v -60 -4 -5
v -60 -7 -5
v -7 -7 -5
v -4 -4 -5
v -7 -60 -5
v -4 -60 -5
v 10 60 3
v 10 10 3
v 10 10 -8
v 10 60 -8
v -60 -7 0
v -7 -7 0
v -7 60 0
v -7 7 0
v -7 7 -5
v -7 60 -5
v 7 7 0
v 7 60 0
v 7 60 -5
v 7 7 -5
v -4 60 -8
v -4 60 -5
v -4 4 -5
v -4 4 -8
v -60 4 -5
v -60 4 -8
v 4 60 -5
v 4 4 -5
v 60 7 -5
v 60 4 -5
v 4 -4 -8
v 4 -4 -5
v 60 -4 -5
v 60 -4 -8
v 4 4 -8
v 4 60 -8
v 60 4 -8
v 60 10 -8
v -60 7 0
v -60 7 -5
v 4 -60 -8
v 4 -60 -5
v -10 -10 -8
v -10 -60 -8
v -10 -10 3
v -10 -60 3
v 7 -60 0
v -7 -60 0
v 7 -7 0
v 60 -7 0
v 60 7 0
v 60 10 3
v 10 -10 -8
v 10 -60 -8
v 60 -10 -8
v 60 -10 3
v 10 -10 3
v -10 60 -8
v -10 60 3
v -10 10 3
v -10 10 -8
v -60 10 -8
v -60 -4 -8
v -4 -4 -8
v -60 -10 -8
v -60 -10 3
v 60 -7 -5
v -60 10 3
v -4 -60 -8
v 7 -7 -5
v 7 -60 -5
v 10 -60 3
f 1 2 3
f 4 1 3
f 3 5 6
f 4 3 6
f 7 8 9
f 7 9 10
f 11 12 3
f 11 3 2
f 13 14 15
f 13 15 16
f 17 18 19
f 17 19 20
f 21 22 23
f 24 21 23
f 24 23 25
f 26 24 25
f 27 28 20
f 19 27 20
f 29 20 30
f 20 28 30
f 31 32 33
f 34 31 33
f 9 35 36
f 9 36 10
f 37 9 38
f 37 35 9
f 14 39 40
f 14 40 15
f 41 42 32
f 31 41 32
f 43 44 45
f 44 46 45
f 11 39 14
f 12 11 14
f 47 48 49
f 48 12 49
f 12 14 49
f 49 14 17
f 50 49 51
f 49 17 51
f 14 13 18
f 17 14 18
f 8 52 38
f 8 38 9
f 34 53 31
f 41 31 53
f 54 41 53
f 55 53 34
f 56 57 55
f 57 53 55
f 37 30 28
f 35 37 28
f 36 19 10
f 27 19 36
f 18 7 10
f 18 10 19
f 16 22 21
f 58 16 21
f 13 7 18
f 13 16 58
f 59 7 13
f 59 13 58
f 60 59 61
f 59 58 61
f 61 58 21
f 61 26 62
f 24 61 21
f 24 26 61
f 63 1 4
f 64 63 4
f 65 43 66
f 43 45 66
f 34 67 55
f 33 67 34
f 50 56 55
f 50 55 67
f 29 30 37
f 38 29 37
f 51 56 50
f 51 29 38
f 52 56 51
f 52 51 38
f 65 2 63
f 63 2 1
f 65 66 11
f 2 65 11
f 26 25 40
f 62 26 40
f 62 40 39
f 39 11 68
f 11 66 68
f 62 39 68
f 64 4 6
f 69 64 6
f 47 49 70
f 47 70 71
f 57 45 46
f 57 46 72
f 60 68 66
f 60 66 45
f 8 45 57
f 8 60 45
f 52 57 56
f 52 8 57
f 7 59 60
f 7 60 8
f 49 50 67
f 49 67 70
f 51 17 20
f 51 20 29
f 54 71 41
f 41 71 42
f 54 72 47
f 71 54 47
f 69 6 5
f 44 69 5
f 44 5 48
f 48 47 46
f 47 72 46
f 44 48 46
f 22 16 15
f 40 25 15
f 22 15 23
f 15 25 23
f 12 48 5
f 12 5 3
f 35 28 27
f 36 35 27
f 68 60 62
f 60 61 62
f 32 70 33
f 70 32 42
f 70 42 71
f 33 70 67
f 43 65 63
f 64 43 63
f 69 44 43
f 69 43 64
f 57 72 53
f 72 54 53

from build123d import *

# Parameters (mm, degrees)
F1_DEPTH = 3
F2_DEPTH = 5
F4_DEPTH = 3


with BuildPart() as f1:
    # F0 (on Top) → F1 (new body)
    with BuildSketch(Plane.XY):
        Polygon((7, -60), (10, -60), (10, -10), (60, -10), (60, -7), (7, -7), align=None)
        Polygon((-7, -60), (7, -60), (7, -7), (60, -7), (60, 7), (7, 7), (7, 60), (-7, 60), (-7, 7), (-60, 7), (-60, -7), (-7, -7), align=None)
        Polygon((-10, -60), (-7, -60), (-7, -7), (-60, -7), (-60, -10), (-10, -10), align=None)
        Polygon((7, 7), (60, 7), (60, 10), (10, 10), (10, 60), (7, 60), align=None)
        Polygon((-60, 10), (-60, 7), (-7, 7), (-7, 60), (-10, 60), (-10, 10), align=None)
    extrude(amount=F1_DEPTH)

    # F0 (on Top) → F2 (join)
    with BuildSketch(Plane.XY):
        Polygon((7, 7), (60, 7), (60, 10), (10, 10), (10, 60), (7, 60), align=None)
        Polygon((-60, 10), (-60, 7), (-7, 7), (-7, 60), (-10, 60), (-10, 10), align=None)
        Polygon((-10, -60), (-7, -60), (-7, -7), (-60, -7), (-60, -10), (-10, -10), align=None)
        Polygon((7, -60), (10, -60), (10, -10), (60, -10), (60, -7), (7, -7), align=None)
    extrude(amount=-F2_DEPTH)

    # F3 (on face) → F4 (join)
    with BuildSketch(Plane(origin=(0, 0, -5), x_dir=(1, 0, 0), z_dir=(0, 0, -1))):
        Polygon((-4, 60), (-10, 60), (-10, 10), (-60, 10), (-60, 4), (-10, 4), (-4, 4), (-4, 10), align=None)
        Polygon((10, 10), (10, 60), (4, 60), (4, 10), (4, 4), (10, 4), (60, 4), (60, 10), align=None)
        Polygon((60, -4), (10, -4), (4, -4), (4, -10), (4, -60), (10, -60), (10, -10), (60, -10), align=None)
        Polygon((-10, -10), (-10, -60), (-4, -60), (-4, -10), (-4, -4), (-10, -4), (-60, -4), (-60, -10), align=None)
    extrude(amount=F4_DEPTH)


solid = f1.part
